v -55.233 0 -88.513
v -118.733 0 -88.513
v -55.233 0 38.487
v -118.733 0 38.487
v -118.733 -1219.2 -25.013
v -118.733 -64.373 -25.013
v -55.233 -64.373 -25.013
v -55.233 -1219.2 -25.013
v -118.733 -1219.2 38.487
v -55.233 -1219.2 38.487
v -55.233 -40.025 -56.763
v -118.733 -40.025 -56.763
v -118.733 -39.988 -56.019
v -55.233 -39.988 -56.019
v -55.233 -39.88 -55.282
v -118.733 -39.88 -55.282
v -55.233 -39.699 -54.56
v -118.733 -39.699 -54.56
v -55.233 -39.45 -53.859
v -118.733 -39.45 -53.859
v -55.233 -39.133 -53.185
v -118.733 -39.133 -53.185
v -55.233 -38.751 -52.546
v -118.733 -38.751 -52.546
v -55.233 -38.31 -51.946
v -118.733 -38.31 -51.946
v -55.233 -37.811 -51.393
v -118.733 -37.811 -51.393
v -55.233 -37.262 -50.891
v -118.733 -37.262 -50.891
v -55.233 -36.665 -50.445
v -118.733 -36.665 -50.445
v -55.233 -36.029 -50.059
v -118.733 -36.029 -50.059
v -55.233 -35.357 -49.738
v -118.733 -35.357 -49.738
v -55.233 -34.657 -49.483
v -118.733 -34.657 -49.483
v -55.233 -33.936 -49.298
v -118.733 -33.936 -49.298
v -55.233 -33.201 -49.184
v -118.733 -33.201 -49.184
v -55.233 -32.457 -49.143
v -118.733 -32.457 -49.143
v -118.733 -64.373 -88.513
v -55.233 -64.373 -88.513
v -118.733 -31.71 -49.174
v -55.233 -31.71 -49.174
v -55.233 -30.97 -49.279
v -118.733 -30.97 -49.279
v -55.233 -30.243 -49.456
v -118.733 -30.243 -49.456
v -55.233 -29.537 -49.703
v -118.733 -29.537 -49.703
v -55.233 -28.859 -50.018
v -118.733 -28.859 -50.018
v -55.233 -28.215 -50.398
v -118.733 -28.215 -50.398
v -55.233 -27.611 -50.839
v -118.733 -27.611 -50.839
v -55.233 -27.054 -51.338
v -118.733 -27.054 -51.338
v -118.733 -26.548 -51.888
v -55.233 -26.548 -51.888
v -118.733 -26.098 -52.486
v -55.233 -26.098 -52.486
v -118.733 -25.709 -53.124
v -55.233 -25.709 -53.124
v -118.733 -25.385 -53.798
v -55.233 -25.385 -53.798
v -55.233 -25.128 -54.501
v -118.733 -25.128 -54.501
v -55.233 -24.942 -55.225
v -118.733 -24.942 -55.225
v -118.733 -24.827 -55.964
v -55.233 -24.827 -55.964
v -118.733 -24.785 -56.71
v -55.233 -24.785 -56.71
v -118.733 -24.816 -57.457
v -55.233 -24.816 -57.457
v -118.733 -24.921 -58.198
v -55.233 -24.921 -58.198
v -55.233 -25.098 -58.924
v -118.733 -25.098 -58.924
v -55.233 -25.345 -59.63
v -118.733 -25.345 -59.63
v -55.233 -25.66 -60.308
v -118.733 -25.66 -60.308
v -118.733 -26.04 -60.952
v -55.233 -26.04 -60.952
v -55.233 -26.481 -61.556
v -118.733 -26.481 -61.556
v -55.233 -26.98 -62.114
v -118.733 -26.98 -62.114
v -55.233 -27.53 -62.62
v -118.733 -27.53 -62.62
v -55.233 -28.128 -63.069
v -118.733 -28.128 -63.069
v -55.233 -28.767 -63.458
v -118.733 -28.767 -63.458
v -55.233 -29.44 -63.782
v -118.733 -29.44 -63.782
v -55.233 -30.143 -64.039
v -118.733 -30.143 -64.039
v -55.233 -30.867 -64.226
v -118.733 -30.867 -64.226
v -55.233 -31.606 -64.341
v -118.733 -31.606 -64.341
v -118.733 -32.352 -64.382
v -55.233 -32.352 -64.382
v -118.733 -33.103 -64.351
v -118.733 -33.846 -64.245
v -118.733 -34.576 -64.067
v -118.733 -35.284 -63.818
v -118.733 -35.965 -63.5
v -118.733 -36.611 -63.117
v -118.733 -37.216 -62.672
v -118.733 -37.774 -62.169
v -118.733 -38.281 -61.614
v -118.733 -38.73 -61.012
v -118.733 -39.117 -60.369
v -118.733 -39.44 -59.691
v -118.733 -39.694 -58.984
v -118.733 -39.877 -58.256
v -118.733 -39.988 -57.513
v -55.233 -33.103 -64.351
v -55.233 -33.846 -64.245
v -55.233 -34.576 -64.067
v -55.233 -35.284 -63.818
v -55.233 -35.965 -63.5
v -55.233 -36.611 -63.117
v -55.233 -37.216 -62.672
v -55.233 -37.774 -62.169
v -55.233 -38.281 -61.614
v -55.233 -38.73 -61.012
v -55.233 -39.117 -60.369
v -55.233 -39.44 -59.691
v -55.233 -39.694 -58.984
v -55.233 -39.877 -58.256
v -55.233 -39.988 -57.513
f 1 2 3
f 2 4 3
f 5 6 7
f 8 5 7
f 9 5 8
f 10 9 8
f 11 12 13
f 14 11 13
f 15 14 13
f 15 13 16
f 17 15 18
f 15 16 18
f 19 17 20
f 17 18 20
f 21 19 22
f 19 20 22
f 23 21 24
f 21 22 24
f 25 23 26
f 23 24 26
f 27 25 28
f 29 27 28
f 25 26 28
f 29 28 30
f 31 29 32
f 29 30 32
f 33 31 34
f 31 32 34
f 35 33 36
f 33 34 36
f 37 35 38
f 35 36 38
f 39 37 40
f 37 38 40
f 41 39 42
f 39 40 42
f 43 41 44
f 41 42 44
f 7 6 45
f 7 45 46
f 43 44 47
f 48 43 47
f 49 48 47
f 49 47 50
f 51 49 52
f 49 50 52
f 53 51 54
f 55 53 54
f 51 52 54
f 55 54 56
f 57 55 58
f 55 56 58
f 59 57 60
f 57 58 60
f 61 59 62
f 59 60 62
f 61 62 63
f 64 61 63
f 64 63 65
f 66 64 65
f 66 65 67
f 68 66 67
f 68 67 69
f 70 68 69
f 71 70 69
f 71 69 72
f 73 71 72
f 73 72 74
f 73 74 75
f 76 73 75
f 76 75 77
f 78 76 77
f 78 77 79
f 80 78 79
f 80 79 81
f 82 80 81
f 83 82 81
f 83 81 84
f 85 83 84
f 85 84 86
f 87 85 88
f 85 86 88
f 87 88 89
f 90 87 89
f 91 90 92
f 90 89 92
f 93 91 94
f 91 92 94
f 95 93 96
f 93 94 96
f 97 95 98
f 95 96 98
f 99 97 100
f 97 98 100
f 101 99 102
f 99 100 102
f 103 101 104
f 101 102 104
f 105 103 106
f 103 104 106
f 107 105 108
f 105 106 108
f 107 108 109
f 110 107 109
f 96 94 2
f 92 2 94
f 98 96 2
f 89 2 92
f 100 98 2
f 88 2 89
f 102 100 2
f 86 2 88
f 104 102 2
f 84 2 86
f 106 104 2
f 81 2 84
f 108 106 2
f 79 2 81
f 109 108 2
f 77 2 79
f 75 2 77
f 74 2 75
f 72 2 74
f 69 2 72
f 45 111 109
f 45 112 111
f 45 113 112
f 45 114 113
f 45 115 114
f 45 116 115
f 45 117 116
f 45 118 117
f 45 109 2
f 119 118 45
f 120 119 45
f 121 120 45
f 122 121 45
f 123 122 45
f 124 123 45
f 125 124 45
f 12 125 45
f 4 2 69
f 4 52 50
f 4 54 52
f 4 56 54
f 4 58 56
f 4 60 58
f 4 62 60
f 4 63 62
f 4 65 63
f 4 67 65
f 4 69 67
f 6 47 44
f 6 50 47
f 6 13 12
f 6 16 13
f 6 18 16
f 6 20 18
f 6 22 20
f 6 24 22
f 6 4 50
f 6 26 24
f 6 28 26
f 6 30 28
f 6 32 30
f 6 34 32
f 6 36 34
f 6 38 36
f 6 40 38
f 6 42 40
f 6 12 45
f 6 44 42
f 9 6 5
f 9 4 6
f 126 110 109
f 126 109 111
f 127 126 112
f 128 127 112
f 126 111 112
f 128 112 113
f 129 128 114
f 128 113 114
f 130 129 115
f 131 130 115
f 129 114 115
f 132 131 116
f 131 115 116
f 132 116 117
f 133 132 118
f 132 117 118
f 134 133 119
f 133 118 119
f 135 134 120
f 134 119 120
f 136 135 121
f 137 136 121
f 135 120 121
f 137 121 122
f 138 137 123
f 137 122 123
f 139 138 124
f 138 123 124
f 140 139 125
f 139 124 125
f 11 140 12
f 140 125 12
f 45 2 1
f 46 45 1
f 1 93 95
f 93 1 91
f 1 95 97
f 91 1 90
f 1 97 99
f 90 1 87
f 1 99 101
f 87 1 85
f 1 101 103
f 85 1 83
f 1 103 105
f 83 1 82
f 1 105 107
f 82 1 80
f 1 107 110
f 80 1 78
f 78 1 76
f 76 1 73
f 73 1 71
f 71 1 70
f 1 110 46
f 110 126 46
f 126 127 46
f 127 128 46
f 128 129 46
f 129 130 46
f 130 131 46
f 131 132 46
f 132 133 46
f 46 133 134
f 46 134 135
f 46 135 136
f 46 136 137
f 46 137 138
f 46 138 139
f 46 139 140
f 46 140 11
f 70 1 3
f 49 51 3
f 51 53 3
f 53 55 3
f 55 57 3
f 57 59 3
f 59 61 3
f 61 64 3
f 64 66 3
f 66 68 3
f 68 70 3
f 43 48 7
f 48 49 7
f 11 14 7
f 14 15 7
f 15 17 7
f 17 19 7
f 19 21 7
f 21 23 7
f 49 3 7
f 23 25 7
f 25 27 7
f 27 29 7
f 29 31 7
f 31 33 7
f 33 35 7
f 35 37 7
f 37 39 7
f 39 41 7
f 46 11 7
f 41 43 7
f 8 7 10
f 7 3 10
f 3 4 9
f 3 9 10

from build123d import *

# Parameters (mm, degrees)
F0_W     = 63.5
F0_H     = 63.5
F1_DEPTH = 1219.2
F2_W     = 63.5
F2_H     = 64.3730163574
F3_DEPTH = 63.5
F5_DEPTH = 76.2


with BuildPart() as f1:
    # F0 (on Front) → F1 (new body)
    with BuildSketch(Plane.XZ):
        with Locations((-86.9832811058, 6.737372756)):
            Rectangle(F0_W, F0_H)
    extrude(amount=F1_DEPTH)

    # F2 (on face) → F3 (join)
    with BuildSketch(Plane(origin=(0, 0, -25.012627244), x_dir=(1, 0, 0), z_dir=(0, 0, -1))):
        with Locations((-86.9832811058, 32.1865081787)):
            Rectangle(F2_W, F2_H)
    extrude(amount=F3_DEPTH)

    # F4 (on face) → F5 (cut)
    with BuildSketch(Plane(origin=(-118.7332811058, 0, 0), x_dir=(0, -1, 0), z_dir=(-1, 0, 0))):
        with BuildLine():
            Line((32.457142012, -49.1428072748), (32.3523825242, -64.3824472132))
            ThreePointArc((32.3523825242, -64.3824472132), (37.7743649699, -62.1692682367), (40.0247622681, -56.762627244))
            ThreePointArc((40.0247622681, -56.762627244), (37.8114032608, -51.3930245421), (32.457142012, -49.1428072748))
        make_face()
        with BuildLine():
            ThreePointArc((32.457142012, -49.1428072748), (24.7849422989, -56.7102475001), (32.3523825242, -64.3824472132))
            Line((32.3523825242, -64.3824472132), (32.457142012, -49.1428072748))
        make_face()
    extrude(amount=-F5_DEPTH, mode=Mode.SUBTRACT)


solid = f1.part
